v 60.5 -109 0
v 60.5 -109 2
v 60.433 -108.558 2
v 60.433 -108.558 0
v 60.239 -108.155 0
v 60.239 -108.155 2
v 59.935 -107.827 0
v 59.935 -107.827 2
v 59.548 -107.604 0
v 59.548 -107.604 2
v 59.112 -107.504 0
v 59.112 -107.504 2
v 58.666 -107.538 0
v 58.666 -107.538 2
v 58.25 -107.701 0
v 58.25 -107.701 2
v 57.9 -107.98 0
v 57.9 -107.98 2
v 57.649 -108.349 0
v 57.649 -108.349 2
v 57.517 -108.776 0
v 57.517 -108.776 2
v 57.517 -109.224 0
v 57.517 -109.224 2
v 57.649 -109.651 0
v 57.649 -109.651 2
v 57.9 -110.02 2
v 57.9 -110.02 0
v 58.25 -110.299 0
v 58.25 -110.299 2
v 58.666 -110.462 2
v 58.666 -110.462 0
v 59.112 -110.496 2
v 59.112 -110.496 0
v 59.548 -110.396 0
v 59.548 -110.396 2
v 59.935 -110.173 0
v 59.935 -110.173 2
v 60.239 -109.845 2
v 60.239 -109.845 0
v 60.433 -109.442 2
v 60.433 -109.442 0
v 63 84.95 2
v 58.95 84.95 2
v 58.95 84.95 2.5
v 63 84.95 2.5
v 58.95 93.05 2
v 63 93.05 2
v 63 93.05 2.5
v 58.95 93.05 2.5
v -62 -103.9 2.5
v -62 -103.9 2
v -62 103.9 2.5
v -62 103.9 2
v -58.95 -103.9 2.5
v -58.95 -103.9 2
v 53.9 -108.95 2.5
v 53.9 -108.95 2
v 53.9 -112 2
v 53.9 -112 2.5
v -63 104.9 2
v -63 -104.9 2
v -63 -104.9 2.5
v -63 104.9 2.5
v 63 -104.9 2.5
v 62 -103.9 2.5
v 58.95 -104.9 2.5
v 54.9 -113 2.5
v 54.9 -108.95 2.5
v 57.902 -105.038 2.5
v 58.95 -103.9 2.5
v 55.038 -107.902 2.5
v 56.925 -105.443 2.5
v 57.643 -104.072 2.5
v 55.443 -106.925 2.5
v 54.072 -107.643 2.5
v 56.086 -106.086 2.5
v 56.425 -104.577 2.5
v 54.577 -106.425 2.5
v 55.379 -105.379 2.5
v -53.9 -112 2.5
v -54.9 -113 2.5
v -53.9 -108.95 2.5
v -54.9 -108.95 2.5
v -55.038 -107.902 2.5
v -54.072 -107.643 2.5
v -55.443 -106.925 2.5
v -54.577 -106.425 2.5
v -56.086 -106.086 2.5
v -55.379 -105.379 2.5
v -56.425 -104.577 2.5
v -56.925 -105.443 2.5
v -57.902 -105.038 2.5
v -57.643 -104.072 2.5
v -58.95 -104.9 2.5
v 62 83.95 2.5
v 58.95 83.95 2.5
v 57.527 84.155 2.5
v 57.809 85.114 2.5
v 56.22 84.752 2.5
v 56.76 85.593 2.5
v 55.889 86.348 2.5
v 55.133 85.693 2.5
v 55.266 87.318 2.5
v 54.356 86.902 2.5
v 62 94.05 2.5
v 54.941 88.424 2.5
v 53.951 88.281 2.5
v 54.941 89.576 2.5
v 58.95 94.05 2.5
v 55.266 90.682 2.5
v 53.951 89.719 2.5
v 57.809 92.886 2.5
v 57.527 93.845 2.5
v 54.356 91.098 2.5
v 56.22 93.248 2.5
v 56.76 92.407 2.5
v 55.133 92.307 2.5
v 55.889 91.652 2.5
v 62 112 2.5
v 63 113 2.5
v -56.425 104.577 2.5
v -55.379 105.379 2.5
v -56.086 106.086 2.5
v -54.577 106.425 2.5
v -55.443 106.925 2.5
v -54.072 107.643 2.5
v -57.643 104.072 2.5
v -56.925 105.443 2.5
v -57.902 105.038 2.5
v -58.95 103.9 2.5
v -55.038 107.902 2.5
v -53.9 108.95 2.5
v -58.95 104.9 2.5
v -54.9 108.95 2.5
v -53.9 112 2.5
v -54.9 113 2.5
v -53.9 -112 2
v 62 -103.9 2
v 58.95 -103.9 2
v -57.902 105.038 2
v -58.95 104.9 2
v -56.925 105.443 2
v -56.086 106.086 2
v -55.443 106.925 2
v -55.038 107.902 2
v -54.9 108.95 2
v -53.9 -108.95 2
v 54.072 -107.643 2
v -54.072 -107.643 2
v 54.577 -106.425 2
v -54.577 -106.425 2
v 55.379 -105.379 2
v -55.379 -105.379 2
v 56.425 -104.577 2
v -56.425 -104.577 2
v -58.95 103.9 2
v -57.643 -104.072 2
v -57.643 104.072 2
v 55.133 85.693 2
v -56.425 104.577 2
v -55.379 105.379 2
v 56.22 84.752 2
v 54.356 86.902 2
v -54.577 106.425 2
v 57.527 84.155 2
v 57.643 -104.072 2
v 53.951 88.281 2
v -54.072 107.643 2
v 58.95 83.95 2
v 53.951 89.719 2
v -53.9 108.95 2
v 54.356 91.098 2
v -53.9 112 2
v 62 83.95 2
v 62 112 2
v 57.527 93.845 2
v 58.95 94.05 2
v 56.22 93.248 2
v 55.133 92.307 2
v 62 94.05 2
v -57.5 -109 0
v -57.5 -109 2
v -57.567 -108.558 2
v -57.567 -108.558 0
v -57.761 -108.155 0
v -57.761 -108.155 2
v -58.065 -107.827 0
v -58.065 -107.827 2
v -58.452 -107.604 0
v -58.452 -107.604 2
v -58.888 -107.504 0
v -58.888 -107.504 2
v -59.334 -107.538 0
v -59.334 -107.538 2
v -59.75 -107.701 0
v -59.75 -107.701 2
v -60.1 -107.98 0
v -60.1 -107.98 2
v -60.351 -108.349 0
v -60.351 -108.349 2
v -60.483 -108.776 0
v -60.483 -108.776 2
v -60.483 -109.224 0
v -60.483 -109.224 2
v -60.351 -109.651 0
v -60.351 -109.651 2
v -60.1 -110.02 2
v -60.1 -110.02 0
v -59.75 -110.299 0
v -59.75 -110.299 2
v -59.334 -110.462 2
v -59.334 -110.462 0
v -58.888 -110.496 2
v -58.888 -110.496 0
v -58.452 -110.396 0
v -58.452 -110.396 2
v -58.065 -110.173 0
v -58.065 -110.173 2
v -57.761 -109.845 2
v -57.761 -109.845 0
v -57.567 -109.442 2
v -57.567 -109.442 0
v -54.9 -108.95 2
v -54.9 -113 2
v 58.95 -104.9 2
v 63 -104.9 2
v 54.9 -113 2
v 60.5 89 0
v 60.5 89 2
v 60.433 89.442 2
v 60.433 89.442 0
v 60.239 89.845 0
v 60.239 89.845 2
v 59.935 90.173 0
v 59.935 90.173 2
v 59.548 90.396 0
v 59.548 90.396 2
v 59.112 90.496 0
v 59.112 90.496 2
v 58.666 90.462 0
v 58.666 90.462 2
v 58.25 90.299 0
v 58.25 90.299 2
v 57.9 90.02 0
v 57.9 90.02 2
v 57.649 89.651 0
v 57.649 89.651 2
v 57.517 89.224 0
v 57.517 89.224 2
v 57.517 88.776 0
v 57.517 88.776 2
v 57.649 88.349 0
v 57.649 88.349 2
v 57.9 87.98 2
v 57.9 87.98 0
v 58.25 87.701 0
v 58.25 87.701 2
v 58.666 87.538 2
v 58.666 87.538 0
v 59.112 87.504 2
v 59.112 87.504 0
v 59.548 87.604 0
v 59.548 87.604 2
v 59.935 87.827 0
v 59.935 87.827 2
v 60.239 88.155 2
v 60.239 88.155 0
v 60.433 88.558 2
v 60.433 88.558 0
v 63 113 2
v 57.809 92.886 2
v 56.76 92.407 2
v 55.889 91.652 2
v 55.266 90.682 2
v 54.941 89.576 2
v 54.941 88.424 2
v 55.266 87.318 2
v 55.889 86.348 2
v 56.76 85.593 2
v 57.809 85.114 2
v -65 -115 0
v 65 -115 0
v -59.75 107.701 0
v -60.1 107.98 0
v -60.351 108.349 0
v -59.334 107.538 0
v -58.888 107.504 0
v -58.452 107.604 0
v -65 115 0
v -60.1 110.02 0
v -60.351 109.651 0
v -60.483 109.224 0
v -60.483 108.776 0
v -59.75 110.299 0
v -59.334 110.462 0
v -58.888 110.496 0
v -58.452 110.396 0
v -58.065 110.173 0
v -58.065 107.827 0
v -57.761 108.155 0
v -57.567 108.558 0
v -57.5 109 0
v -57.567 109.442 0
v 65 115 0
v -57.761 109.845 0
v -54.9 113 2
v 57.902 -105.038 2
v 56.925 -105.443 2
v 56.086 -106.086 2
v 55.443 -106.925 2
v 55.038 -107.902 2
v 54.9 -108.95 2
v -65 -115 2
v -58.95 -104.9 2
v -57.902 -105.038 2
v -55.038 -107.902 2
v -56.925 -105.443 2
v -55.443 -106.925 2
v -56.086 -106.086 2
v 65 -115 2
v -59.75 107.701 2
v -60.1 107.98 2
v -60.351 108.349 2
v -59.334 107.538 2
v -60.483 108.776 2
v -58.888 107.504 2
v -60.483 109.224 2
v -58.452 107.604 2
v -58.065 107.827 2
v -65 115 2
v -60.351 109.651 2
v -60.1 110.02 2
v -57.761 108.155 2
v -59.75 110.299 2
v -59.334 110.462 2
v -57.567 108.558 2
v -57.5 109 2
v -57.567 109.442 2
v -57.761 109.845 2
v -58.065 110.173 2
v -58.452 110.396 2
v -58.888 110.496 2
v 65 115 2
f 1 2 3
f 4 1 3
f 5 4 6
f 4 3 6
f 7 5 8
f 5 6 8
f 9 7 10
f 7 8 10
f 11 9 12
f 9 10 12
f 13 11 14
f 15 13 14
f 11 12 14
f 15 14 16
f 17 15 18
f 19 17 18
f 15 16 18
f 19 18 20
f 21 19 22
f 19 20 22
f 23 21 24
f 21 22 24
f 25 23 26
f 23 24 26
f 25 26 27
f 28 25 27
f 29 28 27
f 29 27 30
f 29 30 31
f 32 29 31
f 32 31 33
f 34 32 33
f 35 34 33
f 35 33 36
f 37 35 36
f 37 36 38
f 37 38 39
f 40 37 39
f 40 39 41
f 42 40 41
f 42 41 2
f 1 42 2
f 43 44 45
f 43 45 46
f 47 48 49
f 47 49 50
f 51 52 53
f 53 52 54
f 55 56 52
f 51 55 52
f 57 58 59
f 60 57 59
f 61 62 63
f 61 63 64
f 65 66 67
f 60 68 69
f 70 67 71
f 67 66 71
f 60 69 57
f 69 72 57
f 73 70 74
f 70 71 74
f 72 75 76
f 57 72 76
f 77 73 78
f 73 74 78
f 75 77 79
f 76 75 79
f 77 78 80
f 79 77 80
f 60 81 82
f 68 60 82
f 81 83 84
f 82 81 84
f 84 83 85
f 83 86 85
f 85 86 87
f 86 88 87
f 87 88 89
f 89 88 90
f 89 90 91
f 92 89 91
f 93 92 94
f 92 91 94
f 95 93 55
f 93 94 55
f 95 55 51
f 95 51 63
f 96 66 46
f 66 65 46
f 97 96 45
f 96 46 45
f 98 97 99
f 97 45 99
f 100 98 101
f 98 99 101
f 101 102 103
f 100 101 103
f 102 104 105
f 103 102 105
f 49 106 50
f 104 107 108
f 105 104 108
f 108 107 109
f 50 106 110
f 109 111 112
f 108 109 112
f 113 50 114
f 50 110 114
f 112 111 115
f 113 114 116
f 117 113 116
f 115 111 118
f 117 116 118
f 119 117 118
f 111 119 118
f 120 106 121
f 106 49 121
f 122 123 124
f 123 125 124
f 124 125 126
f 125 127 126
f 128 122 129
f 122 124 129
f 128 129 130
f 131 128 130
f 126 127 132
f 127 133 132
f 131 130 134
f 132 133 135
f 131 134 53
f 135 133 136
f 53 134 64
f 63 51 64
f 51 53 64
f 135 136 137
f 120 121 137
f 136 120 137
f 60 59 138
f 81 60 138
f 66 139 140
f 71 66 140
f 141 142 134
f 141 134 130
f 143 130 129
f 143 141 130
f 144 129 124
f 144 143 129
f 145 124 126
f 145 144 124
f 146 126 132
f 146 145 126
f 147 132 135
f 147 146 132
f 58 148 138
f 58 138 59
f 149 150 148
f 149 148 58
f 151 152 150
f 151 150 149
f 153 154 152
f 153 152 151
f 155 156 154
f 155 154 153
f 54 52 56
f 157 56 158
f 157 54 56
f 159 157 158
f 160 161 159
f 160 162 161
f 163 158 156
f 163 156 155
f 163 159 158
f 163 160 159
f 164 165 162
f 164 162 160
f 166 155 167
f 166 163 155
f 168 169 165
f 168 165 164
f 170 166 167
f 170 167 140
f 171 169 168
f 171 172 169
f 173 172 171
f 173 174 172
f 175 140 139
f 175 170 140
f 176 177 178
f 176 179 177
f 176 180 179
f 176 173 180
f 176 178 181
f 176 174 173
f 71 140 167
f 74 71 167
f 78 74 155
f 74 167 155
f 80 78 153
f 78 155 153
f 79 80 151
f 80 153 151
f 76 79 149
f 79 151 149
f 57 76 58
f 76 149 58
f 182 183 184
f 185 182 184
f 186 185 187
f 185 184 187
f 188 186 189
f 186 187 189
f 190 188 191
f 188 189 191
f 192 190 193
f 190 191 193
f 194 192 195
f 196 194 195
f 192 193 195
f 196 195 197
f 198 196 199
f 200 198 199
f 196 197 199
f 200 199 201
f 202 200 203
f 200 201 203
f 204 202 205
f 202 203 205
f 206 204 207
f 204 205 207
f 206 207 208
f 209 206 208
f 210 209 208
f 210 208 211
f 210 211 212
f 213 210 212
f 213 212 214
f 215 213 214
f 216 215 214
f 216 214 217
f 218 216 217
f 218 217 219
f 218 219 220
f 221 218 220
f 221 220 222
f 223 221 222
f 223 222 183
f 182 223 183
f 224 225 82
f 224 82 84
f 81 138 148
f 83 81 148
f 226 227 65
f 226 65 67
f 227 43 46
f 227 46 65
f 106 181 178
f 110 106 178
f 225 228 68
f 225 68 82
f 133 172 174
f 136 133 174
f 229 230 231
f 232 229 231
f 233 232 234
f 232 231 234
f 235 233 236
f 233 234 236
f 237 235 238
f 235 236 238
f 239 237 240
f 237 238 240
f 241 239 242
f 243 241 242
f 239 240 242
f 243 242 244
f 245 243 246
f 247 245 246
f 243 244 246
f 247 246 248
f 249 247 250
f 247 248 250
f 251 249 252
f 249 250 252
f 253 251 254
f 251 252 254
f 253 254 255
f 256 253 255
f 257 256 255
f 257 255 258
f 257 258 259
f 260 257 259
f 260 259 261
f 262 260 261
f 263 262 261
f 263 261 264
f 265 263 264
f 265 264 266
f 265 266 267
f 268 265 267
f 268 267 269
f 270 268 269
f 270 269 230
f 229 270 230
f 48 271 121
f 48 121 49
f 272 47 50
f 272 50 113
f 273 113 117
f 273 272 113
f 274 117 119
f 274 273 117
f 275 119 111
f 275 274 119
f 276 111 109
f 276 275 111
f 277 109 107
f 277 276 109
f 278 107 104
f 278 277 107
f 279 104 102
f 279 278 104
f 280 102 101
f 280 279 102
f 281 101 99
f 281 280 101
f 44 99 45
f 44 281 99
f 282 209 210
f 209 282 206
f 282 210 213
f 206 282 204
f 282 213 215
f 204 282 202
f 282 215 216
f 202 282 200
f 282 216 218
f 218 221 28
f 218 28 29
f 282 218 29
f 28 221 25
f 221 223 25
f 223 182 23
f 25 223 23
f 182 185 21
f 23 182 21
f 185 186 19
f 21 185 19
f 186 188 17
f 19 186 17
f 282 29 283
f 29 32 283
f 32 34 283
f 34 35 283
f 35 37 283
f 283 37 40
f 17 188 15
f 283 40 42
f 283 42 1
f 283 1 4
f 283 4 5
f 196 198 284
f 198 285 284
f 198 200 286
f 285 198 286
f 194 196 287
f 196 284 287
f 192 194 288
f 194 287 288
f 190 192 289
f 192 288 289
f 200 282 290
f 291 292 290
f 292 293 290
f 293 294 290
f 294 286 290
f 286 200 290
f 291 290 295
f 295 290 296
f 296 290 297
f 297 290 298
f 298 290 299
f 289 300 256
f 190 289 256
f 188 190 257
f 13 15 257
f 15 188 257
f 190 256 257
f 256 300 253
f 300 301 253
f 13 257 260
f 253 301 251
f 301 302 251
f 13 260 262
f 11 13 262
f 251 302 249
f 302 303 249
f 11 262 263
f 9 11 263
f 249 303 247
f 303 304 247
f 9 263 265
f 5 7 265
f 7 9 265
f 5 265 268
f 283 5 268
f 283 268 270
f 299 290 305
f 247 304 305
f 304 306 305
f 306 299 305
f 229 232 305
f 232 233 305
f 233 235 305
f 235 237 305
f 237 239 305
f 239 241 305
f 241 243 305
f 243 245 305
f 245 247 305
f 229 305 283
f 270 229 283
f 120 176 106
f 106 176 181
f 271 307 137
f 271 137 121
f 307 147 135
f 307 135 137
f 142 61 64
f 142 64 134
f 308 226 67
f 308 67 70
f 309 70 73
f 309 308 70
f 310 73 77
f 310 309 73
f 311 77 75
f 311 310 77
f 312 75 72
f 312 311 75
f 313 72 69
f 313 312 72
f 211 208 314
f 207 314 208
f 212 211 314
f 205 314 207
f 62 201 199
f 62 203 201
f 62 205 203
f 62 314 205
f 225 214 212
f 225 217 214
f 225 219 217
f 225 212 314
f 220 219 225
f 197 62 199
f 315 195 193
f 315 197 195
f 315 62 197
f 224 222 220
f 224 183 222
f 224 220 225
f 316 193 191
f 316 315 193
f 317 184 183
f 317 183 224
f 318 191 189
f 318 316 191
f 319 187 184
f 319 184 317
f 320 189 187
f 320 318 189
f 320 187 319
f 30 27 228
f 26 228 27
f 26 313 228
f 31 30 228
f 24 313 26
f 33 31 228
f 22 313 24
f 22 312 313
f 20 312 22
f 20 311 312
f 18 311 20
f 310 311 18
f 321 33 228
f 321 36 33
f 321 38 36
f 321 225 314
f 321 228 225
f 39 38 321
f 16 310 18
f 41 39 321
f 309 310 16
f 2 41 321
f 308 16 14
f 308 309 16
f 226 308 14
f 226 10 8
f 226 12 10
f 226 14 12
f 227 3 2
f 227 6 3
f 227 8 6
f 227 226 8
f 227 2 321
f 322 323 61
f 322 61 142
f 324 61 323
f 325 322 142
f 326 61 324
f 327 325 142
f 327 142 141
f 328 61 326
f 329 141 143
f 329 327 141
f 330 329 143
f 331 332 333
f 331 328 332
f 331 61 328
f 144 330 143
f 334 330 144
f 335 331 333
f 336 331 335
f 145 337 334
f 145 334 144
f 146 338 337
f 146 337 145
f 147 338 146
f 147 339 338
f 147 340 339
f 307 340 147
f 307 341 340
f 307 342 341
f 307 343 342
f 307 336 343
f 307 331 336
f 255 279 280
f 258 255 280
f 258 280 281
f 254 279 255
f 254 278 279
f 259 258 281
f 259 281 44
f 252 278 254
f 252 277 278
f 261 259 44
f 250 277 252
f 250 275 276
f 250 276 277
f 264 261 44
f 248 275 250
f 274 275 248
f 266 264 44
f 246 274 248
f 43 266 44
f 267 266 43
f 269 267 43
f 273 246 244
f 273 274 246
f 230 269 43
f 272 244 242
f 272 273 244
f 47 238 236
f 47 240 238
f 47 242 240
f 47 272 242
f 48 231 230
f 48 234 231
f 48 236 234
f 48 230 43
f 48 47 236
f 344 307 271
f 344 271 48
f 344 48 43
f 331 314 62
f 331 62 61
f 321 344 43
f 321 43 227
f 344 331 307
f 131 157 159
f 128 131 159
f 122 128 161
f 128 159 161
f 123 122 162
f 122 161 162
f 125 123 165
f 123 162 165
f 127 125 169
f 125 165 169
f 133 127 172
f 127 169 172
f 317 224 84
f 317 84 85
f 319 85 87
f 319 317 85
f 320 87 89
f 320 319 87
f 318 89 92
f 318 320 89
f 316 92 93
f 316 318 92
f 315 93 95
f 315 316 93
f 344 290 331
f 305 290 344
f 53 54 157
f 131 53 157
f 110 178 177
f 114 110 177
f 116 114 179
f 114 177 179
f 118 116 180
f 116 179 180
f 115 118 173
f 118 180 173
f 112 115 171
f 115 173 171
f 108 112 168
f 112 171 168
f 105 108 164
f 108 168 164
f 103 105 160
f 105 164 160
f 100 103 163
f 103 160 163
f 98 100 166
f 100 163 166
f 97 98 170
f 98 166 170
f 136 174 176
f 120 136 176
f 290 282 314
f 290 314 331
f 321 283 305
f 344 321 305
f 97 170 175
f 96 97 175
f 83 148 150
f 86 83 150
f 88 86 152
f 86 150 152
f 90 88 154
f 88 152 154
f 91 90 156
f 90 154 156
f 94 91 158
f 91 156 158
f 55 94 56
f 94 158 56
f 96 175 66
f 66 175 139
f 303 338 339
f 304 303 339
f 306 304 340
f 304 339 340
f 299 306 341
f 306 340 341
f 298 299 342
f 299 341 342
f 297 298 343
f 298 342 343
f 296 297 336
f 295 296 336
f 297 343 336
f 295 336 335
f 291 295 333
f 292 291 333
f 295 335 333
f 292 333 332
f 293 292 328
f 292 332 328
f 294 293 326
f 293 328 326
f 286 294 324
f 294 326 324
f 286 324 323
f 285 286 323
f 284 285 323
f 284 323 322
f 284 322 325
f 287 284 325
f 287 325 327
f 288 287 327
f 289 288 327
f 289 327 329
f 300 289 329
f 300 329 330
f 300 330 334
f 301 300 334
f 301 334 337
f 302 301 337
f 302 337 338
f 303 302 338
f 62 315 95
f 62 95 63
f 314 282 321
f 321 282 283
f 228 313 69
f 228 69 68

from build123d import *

# Parameters (mm, degrees)
SKETCH1_W           = 130
SKETCH1_H           = 230
BOSS_EXTRUDE1_DEPTH = 2
EXTRUDE_THIN1_DEPTH = 0.5
SKETCH3_R           = 1.5
CUT_EXTRUDE1_DEPTH  = 133.113587492


with BuildPart() as part:
    # Sketch1 → Boss-Extrude1 (new body)
    with BuildSketch(Plane.XY):
        Rectangle(SKETCH1_W, SKETCH1_H)
    extrude(amount=BOSS_EXTRUDE1_DEPTH)

    # Sketch2 → Extrude-Thin1 (add)
    with BuildSketch(Plane.XY.offset(2)):
        with BuildLine():
            Line((58.95, 84.95), (63, 84.95))
            Line((63, 84.95), (63, -104.9))
            Line((63, -104.9), (58.95, -104.9))
            ThreePointArc((58.95, -104.9), (56.086217536, -106.086217536), (54.9, -108.95))
            Line((54.9, -108.95), (54.9, -113))
            Line((54.9, -113), (-54.9, -113))
            Line((-54.9, -113), (-54.9, -108.95))
            ThreePointArc((-54.9, -108.95), (-56.086217536, -106.086217536), (-58.95, -104.9))
            Line((-58.95, -104.9), (-63, -104.9))
            Line((-63, -104.9), (-63, 104.9))
            Line((-63, 104.9), (-58.95, 104.9))
            ThreePointArc((-58.95, 104.9), (-56.086217536, 106.086217536), (-54.9, 108.95))
            Line((-54.9, 108.95), (-54.9, 113))
            Line((-54.9, 113), (63, 113))
            Line((63, 113), (63, 93.05))
            Line((63, 93.05), (58.95, 93.05))
            ThreePointArc((58.95, 93.05), (54.9, 89), (58.95, 84.95))
        make_face()
        with BuildLine():
            Line((58.95, 83.95), (62, 83.95))
            Line((62, 83.95), (62, -103.9))
            Line((62, -103.9), (58.95, -103.9))
            ThreePointArc((58.95, -103.9), (55.379110755, -105.379110755), (53.9, -108.95))
            Line((53.9, -108.95), (53.9, -112))
            Line((53.9, -112), (-53.9, -112))
            Line((-53.9, -112), (-53.9, -108.95))
            ThreePointArc((-53.9, -108.95), (-55.379110755, -105.379110755), (-58.95, -103.9))
            Line((-58.95, -103.9), (-62, -103.9))
            Line((-62, -103.9), (-62, 103.9))
            Line((-62, 103.9), (-58.95, 103.9))
            ThreePointArc((-58.95, 103.9), (-55.379110755, 105.379110755), (-53.9, 108.95))
            Line((-53.9, 108.95), (-53.9, 112))
            Line((-53.9, 112), (62, 112))
            Line((62, 112), (62, 94.05))
            Line((62, 94.05), (58.95, 94.05))
            ThreePointArc((58.95, 94.05), (53.9, 89), (58.95, 83.95))
        make_face(mode=Mode.SUBTRACT)
    extrude(amount=EXTRUDE_THIN1_DEPTH)

    # Sketch3 → Cut-Extrude1 (cut, through all)
    with BuildSketch(Plane.XY.offset(2)):
        with Locations((59, -109)):
            Circle(SKETCH3_R)
        with Locations((-59, -109)):
            Circle(SKETCH3_R)
        with Locations((-59, 109)):
            Circle(SKETCH3_R)
        with Locations((59, 89)):
            Circle(SKETCH3_R)
    extrude(amount=-CUT_EXTRUDE1_DEPTH, mode=Mode.SUBTRACT)


solid = part.part
